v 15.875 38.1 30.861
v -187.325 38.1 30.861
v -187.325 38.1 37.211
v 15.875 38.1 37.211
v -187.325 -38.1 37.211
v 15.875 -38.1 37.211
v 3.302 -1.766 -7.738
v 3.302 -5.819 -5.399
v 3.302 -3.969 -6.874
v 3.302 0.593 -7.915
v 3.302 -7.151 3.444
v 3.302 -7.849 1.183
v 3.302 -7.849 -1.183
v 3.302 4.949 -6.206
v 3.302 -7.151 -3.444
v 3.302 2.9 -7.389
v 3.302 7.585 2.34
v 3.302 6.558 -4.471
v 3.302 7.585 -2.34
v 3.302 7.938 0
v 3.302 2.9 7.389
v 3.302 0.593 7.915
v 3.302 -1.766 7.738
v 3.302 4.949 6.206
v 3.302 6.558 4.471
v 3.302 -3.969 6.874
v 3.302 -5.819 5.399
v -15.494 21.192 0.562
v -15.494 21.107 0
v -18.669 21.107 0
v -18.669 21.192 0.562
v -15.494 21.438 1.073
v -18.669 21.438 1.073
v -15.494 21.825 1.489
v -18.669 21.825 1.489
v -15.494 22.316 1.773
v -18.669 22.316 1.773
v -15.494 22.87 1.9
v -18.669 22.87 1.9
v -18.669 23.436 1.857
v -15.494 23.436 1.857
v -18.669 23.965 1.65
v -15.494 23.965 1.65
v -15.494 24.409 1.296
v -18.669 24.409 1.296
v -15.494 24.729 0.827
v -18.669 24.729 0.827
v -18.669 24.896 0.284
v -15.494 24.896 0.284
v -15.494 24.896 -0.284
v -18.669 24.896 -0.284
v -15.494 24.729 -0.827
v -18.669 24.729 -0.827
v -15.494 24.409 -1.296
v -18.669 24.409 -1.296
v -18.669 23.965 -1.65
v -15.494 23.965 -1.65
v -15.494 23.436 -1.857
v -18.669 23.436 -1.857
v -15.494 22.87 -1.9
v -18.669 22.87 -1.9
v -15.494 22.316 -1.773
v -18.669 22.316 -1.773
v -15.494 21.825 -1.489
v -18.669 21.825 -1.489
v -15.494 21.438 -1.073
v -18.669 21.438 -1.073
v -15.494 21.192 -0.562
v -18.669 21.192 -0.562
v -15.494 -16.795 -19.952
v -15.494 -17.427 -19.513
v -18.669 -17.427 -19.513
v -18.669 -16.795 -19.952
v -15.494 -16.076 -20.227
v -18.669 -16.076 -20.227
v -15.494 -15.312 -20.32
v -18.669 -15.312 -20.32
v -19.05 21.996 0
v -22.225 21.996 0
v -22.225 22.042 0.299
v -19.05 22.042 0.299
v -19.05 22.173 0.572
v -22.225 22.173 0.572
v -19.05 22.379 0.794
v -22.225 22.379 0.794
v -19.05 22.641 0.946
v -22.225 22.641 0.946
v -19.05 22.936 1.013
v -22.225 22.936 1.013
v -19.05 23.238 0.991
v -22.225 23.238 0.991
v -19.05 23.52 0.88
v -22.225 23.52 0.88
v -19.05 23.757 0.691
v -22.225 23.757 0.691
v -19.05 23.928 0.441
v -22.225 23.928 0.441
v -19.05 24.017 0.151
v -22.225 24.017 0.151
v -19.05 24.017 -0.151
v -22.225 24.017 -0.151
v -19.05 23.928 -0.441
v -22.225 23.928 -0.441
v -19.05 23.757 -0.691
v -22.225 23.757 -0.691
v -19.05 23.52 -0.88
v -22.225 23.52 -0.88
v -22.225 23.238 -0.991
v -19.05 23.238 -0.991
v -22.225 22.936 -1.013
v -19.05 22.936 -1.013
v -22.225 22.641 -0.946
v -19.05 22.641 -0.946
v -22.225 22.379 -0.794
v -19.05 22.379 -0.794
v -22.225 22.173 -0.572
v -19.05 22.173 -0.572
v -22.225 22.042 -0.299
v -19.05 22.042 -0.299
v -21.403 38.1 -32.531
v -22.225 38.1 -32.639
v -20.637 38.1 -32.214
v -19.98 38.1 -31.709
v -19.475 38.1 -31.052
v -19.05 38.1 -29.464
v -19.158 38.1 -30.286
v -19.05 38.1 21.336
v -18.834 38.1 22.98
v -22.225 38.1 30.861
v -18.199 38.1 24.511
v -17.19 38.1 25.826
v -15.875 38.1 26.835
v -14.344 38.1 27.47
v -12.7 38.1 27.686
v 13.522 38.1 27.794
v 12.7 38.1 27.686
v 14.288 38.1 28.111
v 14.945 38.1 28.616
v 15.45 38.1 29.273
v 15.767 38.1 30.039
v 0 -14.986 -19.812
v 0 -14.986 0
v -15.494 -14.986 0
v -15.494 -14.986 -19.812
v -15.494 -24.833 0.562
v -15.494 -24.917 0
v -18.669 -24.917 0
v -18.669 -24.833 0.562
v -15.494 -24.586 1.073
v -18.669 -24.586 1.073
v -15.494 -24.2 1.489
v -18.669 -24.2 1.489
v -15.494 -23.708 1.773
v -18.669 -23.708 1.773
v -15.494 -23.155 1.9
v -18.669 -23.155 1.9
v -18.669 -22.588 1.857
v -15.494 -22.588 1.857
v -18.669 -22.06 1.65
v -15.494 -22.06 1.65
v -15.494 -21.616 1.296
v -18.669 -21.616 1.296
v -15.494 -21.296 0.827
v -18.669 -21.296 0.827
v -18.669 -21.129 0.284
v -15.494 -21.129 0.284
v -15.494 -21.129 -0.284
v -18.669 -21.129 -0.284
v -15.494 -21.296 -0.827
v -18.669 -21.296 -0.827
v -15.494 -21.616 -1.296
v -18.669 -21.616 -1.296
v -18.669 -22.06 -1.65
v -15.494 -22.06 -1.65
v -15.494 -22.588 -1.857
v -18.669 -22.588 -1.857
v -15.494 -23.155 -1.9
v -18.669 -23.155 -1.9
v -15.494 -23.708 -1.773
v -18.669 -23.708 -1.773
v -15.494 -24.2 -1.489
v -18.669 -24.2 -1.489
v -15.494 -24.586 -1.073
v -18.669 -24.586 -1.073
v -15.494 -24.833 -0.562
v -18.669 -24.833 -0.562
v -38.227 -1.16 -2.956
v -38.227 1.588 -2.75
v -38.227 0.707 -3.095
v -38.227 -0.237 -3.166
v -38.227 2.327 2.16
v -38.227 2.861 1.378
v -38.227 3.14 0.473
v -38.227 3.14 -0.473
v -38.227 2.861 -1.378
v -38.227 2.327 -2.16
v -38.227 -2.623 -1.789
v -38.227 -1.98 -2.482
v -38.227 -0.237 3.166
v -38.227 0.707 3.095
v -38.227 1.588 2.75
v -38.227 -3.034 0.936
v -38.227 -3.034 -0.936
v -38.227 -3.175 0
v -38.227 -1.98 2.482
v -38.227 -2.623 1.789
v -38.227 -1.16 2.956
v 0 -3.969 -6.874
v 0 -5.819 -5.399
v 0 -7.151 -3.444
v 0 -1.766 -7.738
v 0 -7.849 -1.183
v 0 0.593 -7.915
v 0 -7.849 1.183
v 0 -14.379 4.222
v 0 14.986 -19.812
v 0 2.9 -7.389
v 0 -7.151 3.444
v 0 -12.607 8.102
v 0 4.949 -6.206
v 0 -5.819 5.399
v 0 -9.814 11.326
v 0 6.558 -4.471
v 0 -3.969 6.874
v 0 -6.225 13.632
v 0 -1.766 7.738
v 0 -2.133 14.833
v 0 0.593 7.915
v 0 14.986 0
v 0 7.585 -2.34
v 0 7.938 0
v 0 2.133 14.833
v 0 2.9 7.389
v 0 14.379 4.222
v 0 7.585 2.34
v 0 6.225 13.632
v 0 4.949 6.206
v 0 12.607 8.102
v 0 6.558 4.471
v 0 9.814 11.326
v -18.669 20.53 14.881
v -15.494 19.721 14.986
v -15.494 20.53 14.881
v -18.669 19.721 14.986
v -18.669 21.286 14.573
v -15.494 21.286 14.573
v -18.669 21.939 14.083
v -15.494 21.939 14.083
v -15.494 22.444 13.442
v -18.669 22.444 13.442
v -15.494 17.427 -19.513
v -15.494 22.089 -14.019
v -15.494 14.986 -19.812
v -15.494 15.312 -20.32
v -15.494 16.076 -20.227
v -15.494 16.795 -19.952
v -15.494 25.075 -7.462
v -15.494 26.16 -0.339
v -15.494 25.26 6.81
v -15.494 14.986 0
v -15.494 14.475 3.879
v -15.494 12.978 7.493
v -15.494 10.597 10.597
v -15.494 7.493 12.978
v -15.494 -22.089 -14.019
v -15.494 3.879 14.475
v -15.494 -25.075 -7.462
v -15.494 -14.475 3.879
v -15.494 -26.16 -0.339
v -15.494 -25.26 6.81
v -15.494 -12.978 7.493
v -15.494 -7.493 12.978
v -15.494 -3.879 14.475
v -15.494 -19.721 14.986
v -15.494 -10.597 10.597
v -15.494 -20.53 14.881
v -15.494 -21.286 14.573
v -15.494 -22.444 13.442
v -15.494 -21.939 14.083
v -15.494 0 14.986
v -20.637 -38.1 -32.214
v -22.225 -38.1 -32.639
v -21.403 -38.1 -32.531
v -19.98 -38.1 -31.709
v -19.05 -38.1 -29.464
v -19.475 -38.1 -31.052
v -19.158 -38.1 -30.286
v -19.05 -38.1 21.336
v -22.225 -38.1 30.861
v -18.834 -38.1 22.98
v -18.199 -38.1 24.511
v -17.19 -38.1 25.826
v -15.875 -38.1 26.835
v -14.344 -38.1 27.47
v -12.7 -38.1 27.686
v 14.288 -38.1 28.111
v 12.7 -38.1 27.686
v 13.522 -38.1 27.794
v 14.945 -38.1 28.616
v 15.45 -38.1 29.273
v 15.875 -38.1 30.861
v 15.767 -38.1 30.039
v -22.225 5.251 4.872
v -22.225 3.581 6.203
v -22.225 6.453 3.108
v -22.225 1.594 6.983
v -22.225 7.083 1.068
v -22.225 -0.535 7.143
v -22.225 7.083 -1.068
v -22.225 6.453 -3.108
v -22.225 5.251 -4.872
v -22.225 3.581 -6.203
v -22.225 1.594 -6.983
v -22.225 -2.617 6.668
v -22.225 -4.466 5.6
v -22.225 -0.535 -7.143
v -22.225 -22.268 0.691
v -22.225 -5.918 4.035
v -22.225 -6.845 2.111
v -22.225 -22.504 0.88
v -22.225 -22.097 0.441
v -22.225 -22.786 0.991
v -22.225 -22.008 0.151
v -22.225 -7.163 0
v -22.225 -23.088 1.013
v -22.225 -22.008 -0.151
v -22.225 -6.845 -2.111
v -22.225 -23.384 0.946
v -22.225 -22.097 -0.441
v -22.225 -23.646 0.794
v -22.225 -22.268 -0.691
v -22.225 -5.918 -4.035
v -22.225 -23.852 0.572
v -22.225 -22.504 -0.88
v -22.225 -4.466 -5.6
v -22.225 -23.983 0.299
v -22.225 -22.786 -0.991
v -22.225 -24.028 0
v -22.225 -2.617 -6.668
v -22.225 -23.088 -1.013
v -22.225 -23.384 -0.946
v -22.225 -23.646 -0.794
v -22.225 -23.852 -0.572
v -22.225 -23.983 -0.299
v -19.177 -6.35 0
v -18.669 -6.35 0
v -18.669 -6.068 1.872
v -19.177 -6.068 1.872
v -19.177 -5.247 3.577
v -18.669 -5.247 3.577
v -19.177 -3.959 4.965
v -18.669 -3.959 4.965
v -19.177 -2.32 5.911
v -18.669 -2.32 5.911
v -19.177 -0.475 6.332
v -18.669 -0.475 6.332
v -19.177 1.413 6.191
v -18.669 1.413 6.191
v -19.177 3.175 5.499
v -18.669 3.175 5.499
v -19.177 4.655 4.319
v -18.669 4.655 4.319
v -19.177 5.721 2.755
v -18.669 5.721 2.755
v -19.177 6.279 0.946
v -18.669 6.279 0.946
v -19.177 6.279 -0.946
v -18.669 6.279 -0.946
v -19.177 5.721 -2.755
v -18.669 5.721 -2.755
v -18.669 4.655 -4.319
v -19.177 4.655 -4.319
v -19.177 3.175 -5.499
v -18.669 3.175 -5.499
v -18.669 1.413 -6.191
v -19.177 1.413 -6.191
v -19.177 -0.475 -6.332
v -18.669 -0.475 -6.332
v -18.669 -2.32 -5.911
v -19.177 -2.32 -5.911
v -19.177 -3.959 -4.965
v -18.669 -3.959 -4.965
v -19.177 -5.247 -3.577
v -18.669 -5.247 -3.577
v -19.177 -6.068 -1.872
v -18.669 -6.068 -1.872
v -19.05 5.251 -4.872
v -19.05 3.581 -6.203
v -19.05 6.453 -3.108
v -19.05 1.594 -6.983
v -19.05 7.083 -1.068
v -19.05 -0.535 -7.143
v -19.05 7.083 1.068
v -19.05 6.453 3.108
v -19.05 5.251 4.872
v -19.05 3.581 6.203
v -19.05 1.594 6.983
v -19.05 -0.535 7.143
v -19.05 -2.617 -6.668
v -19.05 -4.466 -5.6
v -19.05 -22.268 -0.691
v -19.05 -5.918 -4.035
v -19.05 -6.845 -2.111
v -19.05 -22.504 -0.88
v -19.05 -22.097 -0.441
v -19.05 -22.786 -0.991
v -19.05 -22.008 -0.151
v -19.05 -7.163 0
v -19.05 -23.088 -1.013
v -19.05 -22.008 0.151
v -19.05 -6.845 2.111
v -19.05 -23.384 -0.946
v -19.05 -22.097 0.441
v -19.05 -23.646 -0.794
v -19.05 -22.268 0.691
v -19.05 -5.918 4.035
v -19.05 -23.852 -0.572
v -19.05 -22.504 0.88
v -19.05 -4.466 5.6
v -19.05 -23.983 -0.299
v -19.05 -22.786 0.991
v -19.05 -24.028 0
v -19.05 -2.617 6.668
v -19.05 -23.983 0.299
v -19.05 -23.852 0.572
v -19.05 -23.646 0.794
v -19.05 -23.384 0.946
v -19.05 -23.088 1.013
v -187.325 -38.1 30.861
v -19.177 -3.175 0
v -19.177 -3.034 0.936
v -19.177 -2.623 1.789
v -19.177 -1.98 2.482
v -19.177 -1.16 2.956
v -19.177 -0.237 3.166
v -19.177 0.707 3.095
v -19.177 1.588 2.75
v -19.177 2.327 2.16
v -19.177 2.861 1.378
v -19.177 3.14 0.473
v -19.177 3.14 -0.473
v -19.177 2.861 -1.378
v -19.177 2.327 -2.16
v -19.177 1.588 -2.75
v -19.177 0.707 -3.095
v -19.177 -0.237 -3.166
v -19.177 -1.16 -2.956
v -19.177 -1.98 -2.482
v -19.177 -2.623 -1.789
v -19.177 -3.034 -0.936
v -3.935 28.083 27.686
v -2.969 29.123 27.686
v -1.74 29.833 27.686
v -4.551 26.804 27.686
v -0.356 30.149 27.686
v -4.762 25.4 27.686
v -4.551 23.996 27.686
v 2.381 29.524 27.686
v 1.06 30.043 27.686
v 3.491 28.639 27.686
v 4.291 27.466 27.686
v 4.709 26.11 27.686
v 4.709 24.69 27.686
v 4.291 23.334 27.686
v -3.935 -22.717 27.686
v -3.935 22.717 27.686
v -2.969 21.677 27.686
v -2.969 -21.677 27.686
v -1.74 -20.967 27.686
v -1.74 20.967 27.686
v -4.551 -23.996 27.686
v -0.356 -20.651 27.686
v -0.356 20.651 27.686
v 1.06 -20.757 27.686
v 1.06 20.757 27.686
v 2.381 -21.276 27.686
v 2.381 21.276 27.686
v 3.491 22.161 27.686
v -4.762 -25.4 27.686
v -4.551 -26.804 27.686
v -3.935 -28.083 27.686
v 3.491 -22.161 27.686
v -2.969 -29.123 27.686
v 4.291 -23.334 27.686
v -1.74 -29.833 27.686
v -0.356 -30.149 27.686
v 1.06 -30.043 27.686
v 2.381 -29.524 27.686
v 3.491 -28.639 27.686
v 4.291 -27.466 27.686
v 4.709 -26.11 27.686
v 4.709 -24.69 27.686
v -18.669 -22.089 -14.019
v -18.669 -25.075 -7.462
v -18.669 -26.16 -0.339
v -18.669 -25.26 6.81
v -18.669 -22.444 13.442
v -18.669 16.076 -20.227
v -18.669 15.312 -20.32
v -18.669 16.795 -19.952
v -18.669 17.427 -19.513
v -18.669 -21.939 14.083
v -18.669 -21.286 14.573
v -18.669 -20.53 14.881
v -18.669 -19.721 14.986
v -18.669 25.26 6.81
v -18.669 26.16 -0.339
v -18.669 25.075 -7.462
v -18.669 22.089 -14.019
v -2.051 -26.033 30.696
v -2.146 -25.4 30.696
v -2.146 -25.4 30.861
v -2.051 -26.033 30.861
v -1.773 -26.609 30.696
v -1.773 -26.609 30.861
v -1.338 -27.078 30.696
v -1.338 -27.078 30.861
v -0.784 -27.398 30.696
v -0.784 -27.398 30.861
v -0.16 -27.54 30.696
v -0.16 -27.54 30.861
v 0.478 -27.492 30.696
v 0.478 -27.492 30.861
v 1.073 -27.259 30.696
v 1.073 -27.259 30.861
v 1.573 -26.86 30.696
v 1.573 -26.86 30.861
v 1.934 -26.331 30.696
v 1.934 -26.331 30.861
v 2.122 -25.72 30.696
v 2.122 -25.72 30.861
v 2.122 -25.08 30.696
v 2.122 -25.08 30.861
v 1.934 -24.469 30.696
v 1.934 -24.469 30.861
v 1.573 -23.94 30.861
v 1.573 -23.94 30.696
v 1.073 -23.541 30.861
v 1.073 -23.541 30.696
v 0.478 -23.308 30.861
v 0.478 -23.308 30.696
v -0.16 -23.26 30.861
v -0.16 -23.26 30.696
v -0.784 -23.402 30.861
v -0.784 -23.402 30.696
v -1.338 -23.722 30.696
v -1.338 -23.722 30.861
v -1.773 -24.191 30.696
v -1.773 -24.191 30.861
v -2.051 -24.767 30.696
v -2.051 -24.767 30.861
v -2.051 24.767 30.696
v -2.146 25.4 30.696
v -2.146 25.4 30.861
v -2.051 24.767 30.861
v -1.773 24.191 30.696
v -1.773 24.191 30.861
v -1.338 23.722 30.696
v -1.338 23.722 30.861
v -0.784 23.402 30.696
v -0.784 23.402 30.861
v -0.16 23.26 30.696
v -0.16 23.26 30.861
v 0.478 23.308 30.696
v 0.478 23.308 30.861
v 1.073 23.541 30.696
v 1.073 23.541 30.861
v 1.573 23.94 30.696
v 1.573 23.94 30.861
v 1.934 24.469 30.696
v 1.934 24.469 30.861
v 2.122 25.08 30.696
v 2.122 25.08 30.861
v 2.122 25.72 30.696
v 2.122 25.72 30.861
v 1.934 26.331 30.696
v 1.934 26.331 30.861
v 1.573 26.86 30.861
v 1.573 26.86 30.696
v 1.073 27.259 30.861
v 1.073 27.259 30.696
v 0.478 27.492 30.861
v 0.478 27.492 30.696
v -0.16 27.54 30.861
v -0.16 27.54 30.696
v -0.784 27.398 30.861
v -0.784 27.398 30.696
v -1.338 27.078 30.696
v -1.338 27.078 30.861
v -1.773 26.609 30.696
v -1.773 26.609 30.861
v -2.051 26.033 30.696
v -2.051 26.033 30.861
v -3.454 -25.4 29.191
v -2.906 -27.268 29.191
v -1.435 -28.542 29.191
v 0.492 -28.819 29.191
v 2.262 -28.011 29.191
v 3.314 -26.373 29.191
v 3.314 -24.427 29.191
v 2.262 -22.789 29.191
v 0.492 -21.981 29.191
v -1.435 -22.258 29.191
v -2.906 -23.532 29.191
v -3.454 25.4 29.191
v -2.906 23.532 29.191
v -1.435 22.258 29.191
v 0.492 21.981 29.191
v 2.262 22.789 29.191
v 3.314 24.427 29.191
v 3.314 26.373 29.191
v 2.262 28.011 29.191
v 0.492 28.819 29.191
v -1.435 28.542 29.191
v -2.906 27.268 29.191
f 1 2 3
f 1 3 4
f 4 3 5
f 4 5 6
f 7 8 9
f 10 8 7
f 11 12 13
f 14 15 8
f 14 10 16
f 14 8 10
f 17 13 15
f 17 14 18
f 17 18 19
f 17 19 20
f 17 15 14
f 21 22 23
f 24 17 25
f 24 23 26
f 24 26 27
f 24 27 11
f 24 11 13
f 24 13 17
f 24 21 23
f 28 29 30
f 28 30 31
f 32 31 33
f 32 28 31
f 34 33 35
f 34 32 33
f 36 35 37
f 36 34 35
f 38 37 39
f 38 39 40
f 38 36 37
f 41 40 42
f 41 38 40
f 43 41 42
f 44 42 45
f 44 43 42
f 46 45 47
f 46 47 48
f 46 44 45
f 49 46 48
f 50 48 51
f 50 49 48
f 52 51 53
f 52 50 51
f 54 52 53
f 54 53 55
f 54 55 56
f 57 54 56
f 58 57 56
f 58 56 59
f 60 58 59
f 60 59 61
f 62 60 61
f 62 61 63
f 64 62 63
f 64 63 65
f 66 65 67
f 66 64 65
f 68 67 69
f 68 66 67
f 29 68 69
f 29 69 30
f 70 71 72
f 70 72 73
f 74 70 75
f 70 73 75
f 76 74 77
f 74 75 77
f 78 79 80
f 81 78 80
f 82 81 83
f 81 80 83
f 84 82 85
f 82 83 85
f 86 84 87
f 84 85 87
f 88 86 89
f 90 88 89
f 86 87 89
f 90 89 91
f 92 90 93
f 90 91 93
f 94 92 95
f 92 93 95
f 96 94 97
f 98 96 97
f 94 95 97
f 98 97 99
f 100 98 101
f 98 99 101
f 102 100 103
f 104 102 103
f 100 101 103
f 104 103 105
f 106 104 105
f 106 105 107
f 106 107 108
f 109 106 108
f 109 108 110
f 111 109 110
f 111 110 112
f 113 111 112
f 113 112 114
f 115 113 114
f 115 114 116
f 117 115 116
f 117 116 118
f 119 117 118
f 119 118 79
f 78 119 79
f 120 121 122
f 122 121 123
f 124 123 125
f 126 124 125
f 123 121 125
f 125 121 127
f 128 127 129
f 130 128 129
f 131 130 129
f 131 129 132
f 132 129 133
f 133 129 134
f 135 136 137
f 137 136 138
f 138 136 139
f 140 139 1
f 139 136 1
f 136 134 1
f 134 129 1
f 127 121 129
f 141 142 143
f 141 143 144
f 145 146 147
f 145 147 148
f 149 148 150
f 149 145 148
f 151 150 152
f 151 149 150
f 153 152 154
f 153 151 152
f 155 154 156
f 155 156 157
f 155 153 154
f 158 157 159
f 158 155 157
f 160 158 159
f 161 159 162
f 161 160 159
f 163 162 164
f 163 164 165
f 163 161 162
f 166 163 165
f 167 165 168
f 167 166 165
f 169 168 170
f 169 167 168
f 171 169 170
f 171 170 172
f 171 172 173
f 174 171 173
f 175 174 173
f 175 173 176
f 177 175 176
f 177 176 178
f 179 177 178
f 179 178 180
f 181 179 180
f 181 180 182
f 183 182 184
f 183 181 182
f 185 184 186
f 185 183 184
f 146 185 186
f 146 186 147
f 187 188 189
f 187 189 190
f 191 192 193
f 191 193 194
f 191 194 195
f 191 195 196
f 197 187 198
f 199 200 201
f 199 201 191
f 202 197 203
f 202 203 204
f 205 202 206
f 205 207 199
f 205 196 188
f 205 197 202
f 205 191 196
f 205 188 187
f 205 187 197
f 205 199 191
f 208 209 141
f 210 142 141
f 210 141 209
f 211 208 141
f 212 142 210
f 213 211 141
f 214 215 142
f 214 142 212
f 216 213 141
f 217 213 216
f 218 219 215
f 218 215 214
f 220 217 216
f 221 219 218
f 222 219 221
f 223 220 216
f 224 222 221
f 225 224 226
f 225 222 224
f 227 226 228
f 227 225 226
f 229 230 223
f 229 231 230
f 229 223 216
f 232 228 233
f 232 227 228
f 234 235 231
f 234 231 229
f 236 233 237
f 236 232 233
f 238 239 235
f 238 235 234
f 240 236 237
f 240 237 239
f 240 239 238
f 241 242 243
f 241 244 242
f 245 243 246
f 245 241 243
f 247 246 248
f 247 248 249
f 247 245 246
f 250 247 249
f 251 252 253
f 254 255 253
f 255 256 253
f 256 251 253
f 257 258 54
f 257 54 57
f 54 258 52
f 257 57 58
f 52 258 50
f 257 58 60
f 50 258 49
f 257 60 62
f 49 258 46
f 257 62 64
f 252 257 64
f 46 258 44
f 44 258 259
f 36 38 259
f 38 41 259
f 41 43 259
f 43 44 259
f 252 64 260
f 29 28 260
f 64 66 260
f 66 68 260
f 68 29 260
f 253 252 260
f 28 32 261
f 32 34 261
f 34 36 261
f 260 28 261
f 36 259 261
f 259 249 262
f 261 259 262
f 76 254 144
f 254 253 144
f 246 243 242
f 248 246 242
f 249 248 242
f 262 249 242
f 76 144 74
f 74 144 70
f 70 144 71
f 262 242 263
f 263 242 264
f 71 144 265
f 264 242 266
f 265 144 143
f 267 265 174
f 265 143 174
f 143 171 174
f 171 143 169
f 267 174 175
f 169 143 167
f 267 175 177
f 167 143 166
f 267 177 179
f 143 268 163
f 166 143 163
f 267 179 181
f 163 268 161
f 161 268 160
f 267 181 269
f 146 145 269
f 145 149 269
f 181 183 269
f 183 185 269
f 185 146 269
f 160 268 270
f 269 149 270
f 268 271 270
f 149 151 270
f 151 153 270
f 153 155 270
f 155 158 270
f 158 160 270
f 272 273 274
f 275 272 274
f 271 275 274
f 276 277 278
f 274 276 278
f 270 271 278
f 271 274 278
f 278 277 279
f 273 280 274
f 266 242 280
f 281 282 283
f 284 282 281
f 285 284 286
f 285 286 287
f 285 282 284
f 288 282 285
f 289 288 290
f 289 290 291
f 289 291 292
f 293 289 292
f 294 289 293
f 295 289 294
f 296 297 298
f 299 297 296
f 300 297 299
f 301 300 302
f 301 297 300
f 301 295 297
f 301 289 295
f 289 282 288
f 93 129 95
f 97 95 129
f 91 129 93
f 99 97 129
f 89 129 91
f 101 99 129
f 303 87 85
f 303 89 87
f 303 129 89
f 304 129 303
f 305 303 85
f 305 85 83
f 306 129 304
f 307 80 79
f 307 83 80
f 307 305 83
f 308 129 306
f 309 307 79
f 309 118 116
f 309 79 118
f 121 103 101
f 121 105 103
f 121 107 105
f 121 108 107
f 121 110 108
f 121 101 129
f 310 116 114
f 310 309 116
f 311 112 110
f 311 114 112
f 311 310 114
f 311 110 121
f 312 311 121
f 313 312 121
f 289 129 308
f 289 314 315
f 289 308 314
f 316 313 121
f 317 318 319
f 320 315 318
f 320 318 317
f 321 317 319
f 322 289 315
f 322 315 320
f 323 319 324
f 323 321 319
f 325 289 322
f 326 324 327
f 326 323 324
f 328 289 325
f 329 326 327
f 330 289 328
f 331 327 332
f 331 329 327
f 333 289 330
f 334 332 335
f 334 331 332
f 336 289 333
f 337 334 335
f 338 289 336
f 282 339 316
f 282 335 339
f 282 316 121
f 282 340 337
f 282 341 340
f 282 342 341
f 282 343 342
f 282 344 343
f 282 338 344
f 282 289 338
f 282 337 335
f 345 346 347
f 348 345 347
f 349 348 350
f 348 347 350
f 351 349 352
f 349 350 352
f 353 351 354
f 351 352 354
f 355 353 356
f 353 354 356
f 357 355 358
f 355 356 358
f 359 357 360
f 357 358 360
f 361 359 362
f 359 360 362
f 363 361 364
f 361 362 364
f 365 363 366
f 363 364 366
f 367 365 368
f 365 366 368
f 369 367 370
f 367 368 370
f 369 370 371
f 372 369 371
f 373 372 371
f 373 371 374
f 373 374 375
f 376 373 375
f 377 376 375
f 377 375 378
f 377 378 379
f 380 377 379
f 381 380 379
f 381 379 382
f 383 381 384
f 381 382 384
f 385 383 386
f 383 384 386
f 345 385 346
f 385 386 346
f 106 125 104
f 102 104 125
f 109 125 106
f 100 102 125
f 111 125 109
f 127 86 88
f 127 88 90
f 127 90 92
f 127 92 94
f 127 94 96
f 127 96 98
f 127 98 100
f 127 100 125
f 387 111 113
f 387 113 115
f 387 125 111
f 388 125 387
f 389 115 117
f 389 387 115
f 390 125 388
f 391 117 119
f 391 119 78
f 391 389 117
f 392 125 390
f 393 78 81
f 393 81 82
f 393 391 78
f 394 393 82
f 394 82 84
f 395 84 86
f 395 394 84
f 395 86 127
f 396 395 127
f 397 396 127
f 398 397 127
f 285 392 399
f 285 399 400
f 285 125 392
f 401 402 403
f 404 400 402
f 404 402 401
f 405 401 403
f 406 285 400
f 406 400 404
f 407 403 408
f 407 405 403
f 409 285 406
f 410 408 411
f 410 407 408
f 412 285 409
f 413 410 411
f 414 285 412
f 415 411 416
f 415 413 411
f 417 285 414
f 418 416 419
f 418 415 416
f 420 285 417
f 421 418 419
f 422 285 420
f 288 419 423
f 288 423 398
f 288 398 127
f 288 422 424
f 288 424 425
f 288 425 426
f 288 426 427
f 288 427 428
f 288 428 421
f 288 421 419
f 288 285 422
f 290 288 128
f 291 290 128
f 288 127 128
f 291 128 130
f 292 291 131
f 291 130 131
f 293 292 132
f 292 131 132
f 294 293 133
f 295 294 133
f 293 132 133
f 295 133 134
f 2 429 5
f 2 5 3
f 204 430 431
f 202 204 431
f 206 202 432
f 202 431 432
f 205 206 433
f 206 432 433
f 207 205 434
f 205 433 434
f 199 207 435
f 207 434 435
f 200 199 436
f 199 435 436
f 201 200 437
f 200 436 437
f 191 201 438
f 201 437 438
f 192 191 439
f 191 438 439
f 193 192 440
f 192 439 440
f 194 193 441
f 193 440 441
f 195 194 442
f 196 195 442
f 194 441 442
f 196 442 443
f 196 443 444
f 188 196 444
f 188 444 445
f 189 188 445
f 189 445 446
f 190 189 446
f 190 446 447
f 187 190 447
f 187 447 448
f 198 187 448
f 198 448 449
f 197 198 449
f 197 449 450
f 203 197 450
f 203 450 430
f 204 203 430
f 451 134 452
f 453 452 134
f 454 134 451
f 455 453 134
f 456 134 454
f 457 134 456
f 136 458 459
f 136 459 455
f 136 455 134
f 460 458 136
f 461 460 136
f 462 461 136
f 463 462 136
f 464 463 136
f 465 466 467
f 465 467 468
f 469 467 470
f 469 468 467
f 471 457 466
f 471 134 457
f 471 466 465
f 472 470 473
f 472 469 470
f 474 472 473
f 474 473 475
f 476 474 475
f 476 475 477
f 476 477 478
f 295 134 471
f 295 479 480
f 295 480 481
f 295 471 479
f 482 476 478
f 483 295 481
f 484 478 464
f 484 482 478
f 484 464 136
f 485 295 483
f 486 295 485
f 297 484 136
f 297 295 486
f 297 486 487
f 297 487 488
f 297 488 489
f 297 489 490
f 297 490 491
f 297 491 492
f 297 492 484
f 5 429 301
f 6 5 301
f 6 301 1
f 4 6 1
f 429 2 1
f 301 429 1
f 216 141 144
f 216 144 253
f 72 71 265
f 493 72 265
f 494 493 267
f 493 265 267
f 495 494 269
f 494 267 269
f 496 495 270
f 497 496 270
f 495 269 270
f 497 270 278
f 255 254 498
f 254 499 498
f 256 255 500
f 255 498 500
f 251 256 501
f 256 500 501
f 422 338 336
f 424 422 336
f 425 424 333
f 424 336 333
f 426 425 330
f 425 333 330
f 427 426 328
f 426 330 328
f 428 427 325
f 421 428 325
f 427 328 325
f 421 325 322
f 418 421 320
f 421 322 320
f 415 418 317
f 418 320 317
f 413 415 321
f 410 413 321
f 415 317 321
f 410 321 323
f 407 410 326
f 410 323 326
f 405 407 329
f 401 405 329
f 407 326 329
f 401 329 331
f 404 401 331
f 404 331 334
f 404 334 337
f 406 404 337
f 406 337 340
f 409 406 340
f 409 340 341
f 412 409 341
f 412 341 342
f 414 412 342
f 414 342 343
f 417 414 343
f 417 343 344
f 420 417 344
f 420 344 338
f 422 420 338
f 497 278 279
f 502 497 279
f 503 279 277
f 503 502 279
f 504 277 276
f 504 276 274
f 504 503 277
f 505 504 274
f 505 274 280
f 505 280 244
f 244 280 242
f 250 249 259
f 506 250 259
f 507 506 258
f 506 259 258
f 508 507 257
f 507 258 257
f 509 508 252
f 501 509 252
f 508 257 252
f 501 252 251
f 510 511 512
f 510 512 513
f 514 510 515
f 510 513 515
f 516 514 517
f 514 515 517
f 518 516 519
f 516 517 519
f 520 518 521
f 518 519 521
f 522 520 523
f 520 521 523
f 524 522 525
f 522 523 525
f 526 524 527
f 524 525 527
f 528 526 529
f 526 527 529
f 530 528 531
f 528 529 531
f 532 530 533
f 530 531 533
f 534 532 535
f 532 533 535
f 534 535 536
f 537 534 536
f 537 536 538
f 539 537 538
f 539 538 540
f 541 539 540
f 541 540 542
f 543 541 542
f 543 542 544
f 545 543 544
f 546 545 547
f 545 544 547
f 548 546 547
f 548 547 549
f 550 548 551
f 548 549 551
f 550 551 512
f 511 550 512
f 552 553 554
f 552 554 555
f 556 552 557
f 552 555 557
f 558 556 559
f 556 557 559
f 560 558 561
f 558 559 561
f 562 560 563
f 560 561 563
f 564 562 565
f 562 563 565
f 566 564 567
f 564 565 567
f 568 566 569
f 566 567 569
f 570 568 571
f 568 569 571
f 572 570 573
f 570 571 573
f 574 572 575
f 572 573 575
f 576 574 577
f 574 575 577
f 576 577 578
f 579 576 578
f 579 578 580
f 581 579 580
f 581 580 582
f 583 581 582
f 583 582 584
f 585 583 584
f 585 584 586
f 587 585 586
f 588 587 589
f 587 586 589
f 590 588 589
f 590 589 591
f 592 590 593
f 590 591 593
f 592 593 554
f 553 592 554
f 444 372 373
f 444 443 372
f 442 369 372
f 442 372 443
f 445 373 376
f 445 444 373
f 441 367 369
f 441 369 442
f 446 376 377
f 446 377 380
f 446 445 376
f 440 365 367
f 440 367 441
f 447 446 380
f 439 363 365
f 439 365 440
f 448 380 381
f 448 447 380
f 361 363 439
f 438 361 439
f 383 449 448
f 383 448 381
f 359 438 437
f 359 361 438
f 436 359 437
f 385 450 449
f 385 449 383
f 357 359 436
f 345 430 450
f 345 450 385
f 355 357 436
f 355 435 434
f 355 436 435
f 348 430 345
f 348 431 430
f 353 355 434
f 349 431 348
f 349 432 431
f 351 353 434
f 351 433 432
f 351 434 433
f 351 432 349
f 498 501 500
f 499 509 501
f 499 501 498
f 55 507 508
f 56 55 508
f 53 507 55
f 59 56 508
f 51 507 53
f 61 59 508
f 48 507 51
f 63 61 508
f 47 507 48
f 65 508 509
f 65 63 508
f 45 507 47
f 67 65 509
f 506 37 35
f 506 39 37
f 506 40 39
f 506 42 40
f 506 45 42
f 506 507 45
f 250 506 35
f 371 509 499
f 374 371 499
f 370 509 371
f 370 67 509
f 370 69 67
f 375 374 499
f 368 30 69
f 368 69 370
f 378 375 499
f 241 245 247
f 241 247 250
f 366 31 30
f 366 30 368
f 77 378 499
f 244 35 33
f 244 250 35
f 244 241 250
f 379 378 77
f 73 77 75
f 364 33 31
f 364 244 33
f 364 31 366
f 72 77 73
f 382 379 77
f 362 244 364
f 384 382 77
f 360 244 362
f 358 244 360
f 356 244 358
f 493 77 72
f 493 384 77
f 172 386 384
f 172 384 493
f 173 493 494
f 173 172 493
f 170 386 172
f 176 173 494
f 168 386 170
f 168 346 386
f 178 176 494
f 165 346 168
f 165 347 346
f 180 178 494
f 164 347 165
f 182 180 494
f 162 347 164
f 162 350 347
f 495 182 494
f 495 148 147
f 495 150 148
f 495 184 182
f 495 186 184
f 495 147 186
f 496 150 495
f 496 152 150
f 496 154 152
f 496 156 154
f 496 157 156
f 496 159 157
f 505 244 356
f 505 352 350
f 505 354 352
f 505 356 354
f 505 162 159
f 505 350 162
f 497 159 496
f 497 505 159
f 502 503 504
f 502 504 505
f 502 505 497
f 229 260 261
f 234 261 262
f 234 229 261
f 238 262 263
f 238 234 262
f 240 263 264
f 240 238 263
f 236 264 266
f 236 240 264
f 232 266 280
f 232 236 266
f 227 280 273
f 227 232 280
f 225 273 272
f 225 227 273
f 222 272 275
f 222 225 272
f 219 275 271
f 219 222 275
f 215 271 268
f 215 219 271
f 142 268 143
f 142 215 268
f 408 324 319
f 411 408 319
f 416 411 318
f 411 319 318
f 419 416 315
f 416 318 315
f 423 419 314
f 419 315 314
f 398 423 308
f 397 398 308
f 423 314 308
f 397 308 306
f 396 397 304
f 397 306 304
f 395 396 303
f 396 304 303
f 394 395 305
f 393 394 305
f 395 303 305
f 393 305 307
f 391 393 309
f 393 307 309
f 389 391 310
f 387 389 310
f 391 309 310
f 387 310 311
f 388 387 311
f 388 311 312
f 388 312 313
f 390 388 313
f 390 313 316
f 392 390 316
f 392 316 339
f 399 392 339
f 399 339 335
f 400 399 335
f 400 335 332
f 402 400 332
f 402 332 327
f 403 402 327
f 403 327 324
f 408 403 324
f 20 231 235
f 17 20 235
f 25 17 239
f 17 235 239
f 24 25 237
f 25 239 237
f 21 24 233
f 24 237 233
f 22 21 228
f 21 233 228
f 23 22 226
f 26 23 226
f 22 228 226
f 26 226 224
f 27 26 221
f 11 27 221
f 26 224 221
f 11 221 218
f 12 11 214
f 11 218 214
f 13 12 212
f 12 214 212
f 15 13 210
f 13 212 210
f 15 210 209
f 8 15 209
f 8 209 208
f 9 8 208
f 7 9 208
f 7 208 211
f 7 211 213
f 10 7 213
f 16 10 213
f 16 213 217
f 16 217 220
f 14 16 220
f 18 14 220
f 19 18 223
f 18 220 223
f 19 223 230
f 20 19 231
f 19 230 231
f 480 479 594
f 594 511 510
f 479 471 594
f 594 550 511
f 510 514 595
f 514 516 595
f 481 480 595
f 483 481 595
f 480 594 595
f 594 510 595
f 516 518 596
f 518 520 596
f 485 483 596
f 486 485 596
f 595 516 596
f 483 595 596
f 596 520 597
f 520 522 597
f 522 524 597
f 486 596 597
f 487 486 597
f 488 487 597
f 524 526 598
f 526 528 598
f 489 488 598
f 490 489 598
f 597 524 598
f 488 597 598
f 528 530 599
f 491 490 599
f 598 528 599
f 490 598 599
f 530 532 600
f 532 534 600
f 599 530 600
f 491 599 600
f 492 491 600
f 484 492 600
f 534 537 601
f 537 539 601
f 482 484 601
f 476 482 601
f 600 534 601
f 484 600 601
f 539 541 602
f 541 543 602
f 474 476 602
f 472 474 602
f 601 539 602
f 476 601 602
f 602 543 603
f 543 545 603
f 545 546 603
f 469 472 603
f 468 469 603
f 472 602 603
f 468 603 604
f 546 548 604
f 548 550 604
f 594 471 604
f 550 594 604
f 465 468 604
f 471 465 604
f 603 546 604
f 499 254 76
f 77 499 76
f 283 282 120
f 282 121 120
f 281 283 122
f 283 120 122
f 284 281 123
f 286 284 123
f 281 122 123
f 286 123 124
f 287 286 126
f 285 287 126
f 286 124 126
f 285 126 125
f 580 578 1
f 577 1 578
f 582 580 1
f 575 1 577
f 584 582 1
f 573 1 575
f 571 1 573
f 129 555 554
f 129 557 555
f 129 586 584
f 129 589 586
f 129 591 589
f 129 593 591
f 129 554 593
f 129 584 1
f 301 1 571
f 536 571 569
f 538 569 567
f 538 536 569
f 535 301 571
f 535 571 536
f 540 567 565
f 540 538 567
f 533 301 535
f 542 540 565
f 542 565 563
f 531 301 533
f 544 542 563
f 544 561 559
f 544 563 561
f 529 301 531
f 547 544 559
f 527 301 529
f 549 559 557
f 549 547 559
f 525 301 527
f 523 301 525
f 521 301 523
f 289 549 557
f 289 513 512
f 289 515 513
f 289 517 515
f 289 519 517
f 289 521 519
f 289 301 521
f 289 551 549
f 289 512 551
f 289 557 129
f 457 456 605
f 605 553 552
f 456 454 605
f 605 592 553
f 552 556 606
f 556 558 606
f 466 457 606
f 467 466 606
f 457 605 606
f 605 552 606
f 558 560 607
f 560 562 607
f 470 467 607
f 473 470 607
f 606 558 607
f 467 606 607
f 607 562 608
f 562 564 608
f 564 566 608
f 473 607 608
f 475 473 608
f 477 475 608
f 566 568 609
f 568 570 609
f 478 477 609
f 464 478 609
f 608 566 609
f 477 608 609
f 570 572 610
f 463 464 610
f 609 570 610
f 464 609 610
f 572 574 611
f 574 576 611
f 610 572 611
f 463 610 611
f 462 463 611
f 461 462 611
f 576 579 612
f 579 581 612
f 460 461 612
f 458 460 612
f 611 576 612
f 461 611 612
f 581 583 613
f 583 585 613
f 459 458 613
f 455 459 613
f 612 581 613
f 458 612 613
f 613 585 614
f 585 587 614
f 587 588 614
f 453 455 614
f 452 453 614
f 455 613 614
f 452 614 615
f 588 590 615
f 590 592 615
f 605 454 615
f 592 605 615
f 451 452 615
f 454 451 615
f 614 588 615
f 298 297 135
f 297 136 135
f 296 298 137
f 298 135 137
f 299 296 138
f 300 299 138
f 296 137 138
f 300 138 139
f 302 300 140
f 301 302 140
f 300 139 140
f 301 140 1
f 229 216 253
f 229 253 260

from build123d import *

# Parameters (mm, degrees)
F0_R            = 7.9375
F1_DEPTH        = 3.302
F2_DEPTH        = 15.494
F3_R            = 1.905
F3_R_2          = 3.175
F4_DEPTH        = 3.175
F5_R            = 3.175
F6_DEPTH        = 19.558
F5_R_2          = 6.35
F7_DEPTH        = 0.508
F8_R            = 3.175
F11_DEPTH       = 76.2
F12_R           = 3.17499
F13_R           = 6.35
F14_R           = 7.1628
F14_R_2         = 1.016
F15_DEPTH       = 25.4
F17_W           = 203.2
F17_H           = 76.2
F18_DEPTH       = 6.35
F20_D           = 4.2926
F20_DEPTH       = 19.05
F20_CSINK_D     = 9.525
F20_CSINK_ANGLE = 82
F20_TIP         = 1.2896271466


# Not quite as in the source:
# - a fillet or chamfer is up to 0.001 mm smaller than in the source, because OpenCascade refuses the exact size


with BuildPart() as f1:
    # F0 (on Right) → F1 (new body)
    with BuildSketch(Plane.YZ):
        Circle(F0_R)
    extrude(amount=F1_DEPTH)

    # F0 (on Right) → F2 (join)
    with BuildSketch(Plane.YZ):
        with BuildLine():
            ThreePointArc((-14.986, 0), (0, -14.986), (14.986, 0))
            ThreePointArc((14.986, 0), (0, 14.986), (-14.986, 0))
        make_face()
        Circle(F0_R, mode=Mode.SUBTRACT)
        with BuildLine():
            Line((14.986, -19.812), (14.986, 0))
            ThreePointArc((14.986, 0), (0, -14.986), (-14.986, 0))
            Line((-14.986, 0), (-14.986, -19.812))
            Line((-14.986, -19.812), (14.986, -19.812))
        make_face()
        Circle(F0_R)
    extrude(amount=-F2_DEPTH)

    # F3 (on face) → F4 (join)
    with BuildSketch(Plane(origin=(-15.494, 0, 0), x_dir=(0, -1, 0), z_dir=(-1, 0, 0))):
        with BuildLine():
            Line((-2.18e-08, 14.986), (-21.4445808539, 14.986))
            ThreePointArc((-21.4445808539, 14.986), (-25.9069948799, -3.6438798406), (-16.4787088086, -20.32))
            Line((-16.4787088086, -20.32), (16.4787088086, -20.32))
            ThreePointArc((16.4787088086, -20.32), (25.9069948799, -3.6438798406), (21.4445808539, 14.986))
            Line((21.4445808539, 14.986), (-2.18e-08, 14.986))
        make_face()
        with Locations((-23.0124, 0)):
            Circle(F3_R, mode=Mode.SUBTRACT)
        with BuildLine():
            ThreePointArc((-14.986, 0), (-10.5967022306, 10.5967022152), (-2.18e-08, 14.986))
            ThreePointArc((-2.18e-08, 14.986), (10.5967022152, 10.5967022306), (14.986, 0))
            Line((14.986, 0), (14.986, -19.812))
            Line((14.986, -19.812), (-14.986, -19.812))
            Line((-14.986, -19.812), (-14.986, 0))
        make_face(mode=Mode.SUBTRACT)
        with Locations((23.0124, 0)):
            Circle(F3_R, mode=Mode.SUBTRACT)
        with BuildLine():
            ThreePointArc((14.986, 0), (10.5967022152, 10.5967022306), (-2.18e-08, 14.986))
            ThreePointArc((-2.18e-08, 14.986), (-10.5967022306, 10.5967022152), (-14.986, 0))
            Line((-14.986, 0), (-14.986, -19.812))
            Line((-14.986, -19.812), (14.986, -19.812))
            Line((14.986, -19.812), (14.986, 0))
        make_face()
        Circle(F3_R_2, mode=Mode.SUBTRACT)
        Circle(F3_R_2)
    extrude(amount=F4_DEPTH)

    # F5 (on face) → F6 (join)
    with BuildSketch(Plane(origin=(-18.669, 0, 0), x_dir=(0, -1, 0), z_dir=(-1, 0, 0))):
        Circle(F5_R)
    extrude(amount=F6_DEPTH)

    # F5 (on face) → F7 (join)
    with BuildSketch(Plane(origin=(-18.669, 0, 0), x_dir=(0, -1, 0), z_dir=(-1, 0, 0))):
        Circle(F5_R_2)
        Circle(F5_R, mode=Mode.SUBTRACT)
    extrude(amount=F7_DEPTH)

    # F8
    f8_edges = [f1.edges().sort_by_distance(p)[0] for p in [
        (-17.0815, -21.444581, 14.986),
        (-17.0815, 21.444581, 14.986),
        (-17.0815, 16.478709, -20.32),
        (-17.0815, -16.478709, -20.32),
    ]]
    fillet(f8_edges, radius=F8_R)


with BuildPart() as f11:
    # F10 (on offset) → F11 (new body)
    with BuildSketch(Plane.XZ.offset(38.1)):
        Polygon((-22.225, 30.861), (-22.225, -32.639), (-19.05, -32.639), (-19.05, 27.686), (15.875, 27.686), (15.875, 30.861), align=None)
    extrude(amount=-F11_DEPTH)

    # F12 (radius 3.175 in the source; OpenCascade refuses exactly that, so slightly less here)
    f12_edges = [f11.edges().sort_by_distance(p)[0] for p in [
        (15.875, 0, 27.686),
        (-19.05, 0, -32.639),
    ]]
    fillet(f12_edges, radius=F12_R)

    # F13
    f13_edges = [f11.edges().sort_by_distance(p)[0] for p in [
        (-19.05, 0, 27.686),
    ]]
    fillet(f13_edges, radius=F13_R)

    # F14 (on face) → F15 (cut)
    with BuildSketch(Plane(origin=(-22.225, 0, 0), x_dir=(0, -1, 0), z_dir=(-1, 0, 0))):
        Circle(F14_R)
        with Locations((23.0124, 0)):
            Circle(F14_R_2)
        with Locations((-23.0124, 0)):
            Circle(F14_R_2)
    extrude(amount=-F15_DEPTH, mode=Mode.SUBTRACT)

    # F20
    with Locations(Plane(origin=(0, 0, 27.686), x_dir=(1, 0, 0), z_dir=(0, 0, -1))):
        with Locations((0, -25.4), (0, 25.4)):
            CounterSinkHole(F20_D / 2, F20_CSINK_D / 2, depth=F20_DEPTH, counter_sink_angle=F20_CSINK_ANGLE)
            with Locations((0, 0, -(F20_DEPTH + F20_TIP / 2))):  # 118° drill point
                Cone(0, F20_D / 2, F20_TIP, mode=Mode.SUBTRACT)


with BuildPart() as f18:
    # F17 (on face) → F18 (new body)
    with BuildSketch(Plane.XY.offset(30.861)):
        with Locations((-85.725, 0)):
            Rectangle(F17_W, F17_H)
    extrude(amount=F18_DEPTH)


solid = Compound([f1.part, f11.part, f18.part])
